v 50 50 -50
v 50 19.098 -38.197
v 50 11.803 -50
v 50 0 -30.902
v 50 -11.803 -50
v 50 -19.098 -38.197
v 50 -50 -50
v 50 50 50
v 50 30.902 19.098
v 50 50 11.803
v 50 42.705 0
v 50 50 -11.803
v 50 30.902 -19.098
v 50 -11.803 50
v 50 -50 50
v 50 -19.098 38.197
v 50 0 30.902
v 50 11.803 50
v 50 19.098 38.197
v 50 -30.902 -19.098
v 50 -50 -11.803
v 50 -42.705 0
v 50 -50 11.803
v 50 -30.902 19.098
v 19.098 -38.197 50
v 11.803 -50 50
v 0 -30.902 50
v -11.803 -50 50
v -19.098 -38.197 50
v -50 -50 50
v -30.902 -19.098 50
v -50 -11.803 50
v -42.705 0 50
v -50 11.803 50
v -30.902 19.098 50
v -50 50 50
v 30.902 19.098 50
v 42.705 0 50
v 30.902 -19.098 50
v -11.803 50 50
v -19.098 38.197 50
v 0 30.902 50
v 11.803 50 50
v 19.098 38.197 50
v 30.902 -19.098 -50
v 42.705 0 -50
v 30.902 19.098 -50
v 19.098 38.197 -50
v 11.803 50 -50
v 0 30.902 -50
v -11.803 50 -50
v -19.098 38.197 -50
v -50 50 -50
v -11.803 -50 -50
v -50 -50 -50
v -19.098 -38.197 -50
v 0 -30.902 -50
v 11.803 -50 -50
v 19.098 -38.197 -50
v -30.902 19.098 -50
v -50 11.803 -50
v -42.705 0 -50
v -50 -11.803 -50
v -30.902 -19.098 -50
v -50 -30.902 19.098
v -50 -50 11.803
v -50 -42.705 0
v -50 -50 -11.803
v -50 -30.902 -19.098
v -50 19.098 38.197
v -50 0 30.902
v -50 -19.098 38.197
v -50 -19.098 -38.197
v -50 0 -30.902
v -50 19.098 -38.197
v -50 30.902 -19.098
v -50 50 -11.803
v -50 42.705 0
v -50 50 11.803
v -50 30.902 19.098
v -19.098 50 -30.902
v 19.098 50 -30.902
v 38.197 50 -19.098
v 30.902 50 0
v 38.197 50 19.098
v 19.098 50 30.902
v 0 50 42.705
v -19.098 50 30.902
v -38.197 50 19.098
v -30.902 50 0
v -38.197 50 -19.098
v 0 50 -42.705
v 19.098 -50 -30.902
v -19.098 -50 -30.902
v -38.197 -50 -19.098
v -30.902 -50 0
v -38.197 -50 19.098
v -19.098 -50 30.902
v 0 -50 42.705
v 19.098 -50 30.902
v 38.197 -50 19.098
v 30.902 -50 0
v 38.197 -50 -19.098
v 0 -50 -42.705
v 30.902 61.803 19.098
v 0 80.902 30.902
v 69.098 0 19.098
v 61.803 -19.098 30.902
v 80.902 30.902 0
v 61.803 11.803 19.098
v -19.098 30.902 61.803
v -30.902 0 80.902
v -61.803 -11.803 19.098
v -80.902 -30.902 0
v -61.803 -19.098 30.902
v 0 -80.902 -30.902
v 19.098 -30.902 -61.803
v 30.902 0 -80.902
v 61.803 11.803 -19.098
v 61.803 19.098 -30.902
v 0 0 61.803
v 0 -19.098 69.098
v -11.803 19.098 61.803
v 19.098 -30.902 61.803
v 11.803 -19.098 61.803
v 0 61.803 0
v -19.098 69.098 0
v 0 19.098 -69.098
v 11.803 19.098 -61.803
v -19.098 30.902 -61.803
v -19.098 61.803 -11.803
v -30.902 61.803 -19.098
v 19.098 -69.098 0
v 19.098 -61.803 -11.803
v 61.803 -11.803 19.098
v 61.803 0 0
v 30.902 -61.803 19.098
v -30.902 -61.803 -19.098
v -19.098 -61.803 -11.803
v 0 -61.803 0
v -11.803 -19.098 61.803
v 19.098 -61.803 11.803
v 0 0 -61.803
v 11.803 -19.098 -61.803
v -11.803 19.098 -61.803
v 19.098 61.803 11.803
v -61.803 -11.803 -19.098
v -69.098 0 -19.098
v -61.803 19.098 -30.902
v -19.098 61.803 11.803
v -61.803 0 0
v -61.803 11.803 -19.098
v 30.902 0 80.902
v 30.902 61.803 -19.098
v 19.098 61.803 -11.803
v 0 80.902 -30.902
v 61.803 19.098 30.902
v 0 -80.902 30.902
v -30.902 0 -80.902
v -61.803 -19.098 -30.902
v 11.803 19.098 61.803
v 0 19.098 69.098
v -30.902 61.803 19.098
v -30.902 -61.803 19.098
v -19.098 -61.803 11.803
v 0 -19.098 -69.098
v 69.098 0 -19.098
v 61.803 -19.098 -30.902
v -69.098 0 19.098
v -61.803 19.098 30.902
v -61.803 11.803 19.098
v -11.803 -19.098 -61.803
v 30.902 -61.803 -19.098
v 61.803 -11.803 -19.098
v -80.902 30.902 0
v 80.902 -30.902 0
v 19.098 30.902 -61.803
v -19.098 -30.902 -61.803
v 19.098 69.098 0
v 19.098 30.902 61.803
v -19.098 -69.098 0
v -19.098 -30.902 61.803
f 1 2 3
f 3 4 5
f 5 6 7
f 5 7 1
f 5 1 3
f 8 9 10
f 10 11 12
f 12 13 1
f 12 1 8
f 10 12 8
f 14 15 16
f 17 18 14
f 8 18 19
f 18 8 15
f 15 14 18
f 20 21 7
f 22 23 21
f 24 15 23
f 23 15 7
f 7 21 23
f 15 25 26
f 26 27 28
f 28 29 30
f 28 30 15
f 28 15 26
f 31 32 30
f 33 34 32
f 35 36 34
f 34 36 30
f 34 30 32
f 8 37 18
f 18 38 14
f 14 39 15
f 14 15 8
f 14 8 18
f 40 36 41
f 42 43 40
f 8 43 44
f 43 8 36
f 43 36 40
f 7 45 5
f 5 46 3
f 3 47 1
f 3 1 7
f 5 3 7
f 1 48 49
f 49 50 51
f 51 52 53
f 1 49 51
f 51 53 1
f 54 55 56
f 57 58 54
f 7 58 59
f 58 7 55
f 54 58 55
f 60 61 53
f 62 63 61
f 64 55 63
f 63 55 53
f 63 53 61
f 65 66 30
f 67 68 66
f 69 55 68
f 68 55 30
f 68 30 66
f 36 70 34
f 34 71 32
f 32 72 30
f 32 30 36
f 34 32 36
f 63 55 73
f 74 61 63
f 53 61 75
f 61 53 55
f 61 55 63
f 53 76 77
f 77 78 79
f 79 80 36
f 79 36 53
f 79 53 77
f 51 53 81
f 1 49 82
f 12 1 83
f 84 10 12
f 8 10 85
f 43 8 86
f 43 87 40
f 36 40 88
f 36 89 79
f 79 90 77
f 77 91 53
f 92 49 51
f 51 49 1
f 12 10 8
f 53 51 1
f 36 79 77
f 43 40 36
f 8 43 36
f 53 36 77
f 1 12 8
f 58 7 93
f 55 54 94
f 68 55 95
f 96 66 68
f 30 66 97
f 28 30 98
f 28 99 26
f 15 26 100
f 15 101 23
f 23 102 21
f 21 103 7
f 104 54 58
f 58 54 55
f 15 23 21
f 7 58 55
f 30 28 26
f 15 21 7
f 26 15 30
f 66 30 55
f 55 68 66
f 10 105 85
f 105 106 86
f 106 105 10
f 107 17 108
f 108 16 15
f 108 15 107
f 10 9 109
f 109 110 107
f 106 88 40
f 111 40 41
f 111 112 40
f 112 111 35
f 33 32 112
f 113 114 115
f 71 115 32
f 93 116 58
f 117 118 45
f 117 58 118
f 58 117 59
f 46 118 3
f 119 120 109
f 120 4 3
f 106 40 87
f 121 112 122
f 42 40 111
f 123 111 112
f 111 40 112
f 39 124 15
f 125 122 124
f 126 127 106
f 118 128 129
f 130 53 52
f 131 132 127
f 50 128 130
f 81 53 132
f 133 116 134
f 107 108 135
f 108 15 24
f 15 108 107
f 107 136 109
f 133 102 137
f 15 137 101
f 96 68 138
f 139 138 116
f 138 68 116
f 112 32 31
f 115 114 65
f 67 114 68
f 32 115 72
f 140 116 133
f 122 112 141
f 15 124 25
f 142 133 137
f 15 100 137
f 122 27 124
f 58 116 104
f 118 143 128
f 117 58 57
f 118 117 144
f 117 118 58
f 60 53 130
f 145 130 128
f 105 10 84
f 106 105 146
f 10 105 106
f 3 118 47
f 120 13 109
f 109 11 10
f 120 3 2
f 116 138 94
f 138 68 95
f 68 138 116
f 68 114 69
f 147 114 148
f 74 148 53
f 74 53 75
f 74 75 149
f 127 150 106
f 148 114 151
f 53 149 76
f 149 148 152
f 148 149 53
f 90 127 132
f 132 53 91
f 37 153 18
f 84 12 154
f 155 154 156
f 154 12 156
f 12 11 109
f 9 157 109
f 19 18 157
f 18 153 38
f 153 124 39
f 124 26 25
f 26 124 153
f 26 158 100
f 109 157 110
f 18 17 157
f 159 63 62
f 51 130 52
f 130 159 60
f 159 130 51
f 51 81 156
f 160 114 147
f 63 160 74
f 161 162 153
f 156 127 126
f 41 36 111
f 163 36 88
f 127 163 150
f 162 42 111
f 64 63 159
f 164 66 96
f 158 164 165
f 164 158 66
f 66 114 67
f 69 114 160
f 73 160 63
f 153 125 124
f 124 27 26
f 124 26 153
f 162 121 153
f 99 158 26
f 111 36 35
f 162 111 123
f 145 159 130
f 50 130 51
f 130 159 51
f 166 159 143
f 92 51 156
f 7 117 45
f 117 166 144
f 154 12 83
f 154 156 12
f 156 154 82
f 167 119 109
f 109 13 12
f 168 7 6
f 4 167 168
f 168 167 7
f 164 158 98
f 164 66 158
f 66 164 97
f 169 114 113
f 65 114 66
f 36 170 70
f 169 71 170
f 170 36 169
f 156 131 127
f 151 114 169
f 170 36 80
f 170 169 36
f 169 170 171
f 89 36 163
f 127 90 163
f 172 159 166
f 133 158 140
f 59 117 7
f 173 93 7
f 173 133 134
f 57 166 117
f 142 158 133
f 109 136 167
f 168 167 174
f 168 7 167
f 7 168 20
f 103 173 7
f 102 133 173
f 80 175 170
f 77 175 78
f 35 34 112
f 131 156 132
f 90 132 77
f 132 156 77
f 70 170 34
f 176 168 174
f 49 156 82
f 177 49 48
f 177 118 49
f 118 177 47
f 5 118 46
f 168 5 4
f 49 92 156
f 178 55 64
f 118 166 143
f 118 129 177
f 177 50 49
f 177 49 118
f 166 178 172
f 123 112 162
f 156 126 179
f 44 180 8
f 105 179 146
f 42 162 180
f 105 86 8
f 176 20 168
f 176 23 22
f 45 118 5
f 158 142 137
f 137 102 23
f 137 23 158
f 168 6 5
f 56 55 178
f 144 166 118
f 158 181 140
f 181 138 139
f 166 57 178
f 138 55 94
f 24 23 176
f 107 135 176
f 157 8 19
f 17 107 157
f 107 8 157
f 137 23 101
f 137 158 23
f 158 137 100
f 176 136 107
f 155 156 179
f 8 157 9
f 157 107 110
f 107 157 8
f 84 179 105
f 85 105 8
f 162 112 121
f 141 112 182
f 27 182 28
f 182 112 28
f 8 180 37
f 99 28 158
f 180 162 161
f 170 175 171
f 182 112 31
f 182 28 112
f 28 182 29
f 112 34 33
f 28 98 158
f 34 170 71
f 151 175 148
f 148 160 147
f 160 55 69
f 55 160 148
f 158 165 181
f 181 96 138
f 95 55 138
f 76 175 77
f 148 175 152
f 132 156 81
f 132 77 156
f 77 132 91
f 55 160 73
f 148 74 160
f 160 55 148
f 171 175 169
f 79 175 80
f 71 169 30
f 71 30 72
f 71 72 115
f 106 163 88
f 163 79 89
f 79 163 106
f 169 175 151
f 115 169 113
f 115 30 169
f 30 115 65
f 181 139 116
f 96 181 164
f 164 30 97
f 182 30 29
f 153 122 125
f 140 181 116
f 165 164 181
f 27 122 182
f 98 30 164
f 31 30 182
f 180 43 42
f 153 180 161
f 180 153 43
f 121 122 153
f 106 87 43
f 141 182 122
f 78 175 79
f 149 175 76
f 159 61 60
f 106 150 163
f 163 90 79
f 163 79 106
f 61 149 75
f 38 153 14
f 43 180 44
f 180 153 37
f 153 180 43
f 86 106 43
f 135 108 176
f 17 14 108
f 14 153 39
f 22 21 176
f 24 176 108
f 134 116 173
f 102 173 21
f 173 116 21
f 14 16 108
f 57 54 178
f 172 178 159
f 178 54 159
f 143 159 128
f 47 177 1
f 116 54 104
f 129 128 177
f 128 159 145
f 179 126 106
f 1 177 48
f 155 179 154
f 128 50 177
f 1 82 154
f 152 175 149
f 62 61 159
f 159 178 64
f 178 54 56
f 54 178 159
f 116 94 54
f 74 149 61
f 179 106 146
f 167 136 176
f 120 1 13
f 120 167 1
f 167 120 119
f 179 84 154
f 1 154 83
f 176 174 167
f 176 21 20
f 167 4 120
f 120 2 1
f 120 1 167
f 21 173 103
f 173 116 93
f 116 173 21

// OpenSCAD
// Composto de cinco cubos

/*
  O solido gerado serah a uniao de 5 cubos, formando uma figura cuja envoltoria
  convexa eh um dodecaedro.

  Cada cubo eh gerado pela rotacao de um cubo basico, com um angulo multiplo de
  72 graus, em torno de um eixo definido por um certo vetor (o vetor aponta para
  uma das 12 faces do dodecaedro formado pela figura). Cada uma das 12 x 5 = 60
  arestas dos 5 cubos eh uma diagonal de uma face do dodecaedro. Para cada face,
  as diagonais formam uma estrela de 5 pontas.
*/

// Definindo o angulo fundamental de rotacao
angulo = 72;

// Definindo um tamanho para o cubo basico
tamanho_cubo = 100;

// Definindo a lista de cores dos 5 cubos
cores = ["yellow", "red", "blue", "green", "magenta"];

// Definindo o numero aureo
aureo = (1 + sqrt(5))/2;

// Definindo o vetor que serah o eixo de rotacao para o cubo basico
eixo_de_rotacao = [0, (2 + aureo)/5, (1 + 3*aureo)/5];

module cubo_rotacionado(i) {
    color(cores[i]) {
        rotate(i * angulo, eixo_de_rotacao) {
            cube(tamanho_cubo,center=true);
        }
    }
}


module cubos() {
    for (i = [0:4]) {
        cubo_rotacionado(i);
    }
}

cubos();
